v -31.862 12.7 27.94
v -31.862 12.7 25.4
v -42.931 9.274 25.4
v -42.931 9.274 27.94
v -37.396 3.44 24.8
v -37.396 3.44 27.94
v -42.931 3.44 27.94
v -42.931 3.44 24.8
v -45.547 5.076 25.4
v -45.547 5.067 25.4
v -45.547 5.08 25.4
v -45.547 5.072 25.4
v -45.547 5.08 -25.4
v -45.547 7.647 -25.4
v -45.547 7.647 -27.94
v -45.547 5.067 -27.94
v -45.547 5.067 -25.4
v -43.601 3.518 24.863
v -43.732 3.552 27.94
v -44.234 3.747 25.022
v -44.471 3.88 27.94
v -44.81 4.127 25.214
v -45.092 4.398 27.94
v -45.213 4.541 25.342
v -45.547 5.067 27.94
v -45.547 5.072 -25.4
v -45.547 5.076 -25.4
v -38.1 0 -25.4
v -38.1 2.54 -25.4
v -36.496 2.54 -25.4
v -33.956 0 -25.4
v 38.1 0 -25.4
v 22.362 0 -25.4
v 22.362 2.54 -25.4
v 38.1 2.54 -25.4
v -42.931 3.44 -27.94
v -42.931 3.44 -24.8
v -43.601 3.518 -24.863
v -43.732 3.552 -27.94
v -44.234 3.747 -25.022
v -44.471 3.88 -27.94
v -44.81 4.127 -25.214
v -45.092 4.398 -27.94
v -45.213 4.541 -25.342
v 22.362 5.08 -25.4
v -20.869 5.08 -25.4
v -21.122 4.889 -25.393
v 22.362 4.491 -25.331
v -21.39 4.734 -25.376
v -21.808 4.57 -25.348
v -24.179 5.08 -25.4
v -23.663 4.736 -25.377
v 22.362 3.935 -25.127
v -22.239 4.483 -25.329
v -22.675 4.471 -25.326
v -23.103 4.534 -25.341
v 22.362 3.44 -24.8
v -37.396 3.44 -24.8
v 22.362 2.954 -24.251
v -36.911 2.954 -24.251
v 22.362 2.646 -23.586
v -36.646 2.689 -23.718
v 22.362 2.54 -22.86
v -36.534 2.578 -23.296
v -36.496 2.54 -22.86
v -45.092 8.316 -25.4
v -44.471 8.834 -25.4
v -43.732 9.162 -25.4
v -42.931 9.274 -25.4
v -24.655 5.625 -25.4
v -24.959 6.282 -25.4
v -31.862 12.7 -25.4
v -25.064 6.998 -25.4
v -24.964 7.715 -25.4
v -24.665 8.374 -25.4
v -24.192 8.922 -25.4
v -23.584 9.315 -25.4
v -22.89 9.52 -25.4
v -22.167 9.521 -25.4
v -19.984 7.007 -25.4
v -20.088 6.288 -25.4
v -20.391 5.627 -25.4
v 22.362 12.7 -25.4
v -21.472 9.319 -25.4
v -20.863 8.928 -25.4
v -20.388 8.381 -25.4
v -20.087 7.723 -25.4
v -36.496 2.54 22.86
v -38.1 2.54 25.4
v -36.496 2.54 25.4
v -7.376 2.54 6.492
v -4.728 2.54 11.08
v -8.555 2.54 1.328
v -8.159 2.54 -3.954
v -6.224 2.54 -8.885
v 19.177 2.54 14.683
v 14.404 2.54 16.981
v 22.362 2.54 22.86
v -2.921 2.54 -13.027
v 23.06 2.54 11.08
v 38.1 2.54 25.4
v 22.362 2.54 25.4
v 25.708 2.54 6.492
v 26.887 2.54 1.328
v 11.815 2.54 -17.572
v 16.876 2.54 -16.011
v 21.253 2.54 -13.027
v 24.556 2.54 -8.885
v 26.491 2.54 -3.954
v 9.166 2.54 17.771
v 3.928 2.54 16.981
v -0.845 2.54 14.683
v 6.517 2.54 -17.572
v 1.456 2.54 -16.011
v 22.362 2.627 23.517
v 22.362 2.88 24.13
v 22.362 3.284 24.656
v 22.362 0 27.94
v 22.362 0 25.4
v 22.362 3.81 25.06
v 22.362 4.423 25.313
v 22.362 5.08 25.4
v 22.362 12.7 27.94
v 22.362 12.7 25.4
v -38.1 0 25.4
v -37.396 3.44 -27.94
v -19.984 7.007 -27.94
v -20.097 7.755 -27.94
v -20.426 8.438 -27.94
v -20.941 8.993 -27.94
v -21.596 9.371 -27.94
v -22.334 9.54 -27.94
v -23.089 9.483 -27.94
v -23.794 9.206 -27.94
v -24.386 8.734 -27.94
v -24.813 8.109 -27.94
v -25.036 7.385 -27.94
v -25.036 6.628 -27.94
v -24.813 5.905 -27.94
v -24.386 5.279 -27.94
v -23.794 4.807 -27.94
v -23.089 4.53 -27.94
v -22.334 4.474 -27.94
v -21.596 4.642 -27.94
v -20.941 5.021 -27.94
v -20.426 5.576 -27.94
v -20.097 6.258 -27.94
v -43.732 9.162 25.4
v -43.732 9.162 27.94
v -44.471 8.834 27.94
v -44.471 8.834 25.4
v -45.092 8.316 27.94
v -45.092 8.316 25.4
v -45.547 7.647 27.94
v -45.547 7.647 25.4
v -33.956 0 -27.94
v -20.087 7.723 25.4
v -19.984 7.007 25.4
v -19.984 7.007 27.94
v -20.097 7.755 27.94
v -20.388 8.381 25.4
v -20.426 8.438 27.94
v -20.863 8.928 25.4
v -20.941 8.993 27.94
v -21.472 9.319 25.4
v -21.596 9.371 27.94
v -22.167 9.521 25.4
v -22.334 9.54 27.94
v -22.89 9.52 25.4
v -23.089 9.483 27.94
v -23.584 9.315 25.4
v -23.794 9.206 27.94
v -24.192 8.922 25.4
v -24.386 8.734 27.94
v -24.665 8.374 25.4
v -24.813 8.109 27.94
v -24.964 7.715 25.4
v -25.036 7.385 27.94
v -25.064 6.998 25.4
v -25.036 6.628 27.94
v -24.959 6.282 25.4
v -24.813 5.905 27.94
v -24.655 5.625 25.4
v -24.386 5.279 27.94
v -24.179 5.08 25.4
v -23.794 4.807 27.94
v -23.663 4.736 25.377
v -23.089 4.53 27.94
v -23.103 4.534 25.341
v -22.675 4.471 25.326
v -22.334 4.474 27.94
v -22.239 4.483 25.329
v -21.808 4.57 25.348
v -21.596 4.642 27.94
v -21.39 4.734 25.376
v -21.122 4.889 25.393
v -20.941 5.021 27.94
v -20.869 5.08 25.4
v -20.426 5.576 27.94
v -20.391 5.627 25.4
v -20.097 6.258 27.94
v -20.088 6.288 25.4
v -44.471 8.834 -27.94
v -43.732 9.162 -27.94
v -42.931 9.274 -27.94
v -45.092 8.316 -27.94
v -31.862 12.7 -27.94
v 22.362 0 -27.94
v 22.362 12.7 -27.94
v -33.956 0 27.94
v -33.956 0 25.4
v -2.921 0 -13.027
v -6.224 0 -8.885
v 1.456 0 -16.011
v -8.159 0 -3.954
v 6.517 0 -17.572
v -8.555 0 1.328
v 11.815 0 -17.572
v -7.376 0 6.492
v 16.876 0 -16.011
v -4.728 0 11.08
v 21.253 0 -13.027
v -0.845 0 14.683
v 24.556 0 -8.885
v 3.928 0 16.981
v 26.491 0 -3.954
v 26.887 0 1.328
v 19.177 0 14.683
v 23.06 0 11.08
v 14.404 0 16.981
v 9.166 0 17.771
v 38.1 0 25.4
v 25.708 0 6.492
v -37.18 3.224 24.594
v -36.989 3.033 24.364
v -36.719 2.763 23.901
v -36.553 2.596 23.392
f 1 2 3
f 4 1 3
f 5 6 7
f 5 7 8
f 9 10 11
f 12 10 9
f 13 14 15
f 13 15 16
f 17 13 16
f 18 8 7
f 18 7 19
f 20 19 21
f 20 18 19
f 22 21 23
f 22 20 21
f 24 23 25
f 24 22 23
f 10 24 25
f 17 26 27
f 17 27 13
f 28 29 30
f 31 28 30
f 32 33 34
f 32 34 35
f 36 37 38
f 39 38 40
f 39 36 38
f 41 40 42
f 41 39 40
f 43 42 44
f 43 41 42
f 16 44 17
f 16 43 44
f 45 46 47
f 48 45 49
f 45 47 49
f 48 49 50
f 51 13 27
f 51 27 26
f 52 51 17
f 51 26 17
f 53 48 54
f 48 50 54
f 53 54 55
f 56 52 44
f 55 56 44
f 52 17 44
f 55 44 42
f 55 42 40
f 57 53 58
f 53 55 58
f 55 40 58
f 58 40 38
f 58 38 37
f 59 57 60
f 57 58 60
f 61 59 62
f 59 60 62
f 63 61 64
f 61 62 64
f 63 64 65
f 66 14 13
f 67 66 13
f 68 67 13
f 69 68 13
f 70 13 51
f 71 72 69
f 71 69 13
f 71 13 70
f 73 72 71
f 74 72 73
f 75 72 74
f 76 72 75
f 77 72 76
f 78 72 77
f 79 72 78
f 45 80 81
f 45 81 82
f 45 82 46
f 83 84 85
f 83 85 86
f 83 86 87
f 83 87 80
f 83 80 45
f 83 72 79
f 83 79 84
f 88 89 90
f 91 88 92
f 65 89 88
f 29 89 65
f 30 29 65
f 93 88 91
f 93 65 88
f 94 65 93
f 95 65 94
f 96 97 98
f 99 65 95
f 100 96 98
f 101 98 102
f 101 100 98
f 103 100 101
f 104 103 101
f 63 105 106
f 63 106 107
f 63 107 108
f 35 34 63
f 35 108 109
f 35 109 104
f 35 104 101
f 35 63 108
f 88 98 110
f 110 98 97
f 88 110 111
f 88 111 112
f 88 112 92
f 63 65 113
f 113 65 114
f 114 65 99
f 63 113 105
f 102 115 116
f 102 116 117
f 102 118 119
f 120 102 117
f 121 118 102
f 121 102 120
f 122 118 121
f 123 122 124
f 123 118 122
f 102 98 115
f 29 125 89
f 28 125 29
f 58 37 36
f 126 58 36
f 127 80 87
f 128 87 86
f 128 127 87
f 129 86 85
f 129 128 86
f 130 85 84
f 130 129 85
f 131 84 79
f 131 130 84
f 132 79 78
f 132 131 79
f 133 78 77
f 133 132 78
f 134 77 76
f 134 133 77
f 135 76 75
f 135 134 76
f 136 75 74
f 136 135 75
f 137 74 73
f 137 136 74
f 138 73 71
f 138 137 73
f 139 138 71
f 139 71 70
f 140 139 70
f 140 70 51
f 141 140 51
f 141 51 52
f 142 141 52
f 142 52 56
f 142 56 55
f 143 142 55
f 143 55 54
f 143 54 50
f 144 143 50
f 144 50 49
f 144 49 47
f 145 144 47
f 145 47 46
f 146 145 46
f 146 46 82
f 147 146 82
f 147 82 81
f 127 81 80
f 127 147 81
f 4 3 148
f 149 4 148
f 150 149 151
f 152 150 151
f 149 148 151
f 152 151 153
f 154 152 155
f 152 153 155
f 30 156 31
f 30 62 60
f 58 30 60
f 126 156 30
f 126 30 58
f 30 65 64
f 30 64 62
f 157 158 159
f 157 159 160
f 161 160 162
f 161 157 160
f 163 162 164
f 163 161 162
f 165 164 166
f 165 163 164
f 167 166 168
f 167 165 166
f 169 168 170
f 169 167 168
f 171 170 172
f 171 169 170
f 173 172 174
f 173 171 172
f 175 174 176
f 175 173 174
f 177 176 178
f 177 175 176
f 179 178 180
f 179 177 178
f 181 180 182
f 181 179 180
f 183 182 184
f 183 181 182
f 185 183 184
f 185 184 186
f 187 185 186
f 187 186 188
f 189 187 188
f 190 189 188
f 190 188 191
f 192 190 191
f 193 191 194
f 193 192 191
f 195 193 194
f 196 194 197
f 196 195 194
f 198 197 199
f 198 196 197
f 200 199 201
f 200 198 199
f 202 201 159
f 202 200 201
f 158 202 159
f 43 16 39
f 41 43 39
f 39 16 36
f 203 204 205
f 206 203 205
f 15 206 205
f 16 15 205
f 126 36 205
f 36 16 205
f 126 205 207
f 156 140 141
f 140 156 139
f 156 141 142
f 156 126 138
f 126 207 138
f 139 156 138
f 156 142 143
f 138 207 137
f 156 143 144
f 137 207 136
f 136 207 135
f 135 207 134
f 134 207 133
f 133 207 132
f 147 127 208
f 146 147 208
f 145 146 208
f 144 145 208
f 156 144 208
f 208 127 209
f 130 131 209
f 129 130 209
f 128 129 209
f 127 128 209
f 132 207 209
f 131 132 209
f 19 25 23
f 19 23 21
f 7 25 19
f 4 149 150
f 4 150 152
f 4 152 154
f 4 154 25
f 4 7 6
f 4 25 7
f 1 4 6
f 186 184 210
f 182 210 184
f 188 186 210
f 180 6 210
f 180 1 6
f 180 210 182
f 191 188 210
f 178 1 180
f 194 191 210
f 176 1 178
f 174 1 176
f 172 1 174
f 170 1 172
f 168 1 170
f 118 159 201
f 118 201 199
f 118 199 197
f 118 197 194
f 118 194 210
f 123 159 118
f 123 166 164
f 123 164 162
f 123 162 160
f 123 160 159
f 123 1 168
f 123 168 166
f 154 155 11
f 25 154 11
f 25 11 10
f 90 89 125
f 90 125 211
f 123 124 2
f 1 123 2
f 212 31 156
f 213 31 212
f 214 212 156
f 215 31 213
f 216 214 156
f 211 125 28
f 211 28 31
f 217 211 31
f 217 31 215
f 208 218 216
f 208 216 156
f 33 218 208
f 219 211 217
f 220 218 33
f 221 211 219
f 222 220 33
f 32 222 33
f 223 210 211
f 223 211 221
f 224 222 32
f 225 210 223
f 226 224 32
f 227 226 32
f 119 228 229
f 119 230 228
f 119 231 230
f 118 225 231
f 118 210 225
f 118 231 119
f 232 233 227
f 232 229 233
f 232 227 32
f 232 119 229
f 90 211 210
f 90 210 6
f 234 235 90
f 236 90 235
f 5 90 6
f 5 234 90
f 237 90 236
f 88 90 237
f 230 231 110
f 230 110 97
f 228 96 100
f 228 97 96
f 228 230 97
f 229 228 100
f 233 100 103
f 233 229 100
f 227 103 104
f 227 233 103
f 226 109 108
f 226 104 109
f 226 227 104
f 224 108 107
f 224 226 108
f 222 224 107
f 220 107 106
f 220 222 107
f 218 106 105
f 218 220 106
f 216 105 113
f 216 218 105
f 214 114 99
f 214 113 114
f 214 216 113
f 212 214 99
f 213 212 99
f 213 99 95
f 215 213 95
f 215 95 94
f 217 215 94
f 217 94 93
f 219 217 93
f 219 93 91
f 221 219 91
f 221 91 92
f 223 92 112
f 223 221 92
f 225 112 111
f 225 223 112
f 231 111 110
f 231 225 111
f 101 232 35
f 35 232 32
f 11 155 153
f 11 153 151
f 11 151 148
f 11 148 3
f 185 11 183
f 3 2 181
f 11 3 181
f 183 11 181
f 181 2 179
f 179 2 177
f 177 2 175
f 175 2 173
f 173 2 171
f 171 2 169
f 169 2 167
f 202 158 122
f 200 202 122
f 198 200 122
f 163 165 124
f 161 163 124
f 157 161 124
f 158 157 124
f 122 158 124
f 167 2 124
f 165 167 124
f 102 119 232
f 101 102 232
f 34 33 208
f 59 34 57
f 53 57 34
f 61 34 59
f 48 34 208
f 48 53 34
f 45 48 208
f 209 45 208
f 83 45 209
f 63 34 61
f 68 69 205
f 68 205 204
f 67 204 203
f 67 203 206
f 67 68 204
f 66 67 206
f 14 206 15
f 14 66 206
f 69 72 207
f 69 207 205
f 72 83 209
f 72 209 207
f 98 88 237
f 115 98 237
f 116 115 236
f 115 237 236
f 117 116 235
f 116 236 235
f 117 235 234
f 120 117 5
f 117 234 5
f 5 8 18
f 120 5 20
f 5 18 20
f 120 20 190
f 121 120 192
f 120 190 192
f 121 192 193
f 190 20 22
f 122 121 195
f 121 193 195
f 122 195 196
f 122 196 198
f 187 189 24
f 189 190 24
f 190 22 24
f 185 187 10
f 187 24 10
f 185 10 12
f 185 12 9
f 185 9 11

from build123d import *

# Parameters (mm, degrees)
SKETCH1_W               = 76.2
SKETCH1_H               = 50.8
BOSS_EXTRUDE1_DEPTH     = 2.54
BOSS_EXTRUDE3_DEPTH     = 2.54
FILLET1_START           = -37.396373698
FILLET1_DEPTH           = 59.758551136
FILLET1_START_2         = -45.547043779
FILLET1_2_DEPTH         = 8.279361144
FILLET1_START_3         = 22
FILLET1_3_DEPTH         = 3.4
FILLET2_START           = -42.930825639
FILLET2_DEPTH           = 65.293003077
FILLET2_START_2         = -37.396373698
FILLET2_2_DEPTH         = 59.758551136
FILLET2_START_3         = -45.547043779
FILLET2_3_DEPTH         = 2.61621814
FILLET2_START_4         = -25.4
FILLET2_4_DEPTH         = 3.4
CUT_EXTRUDE1_DEPTH      = 74.201076537
CUT_EXTRUDE1_DEPTH_BACK = 74.201076537
SKETCH3_R               = 2.54
CUT_EXTRUDE2_DEPTH      = 55.391197925
CUT_EXTRUDE2_DEPTH_BACK = 55.391197925
SKETCH4_R               = 17.770620532


with BuildPart() as part:
    # Sketch1 → Boss-Extrude1 (new body)
    with BuildSketch(Plane(origin=(0, 0, 0), x_dir=(1, 0, 0), z_dir=(0, 1, 0))):
        Rectangle(SKETCH1_W, SKETCH1_H)
    extrude(amount=BOSS_EXTRUDE1_DEPTH)

    # Sketch2 → Boss-Extrude3 (add)
    with BuildSketch(Plane.XY.offset(25.4)):
        Polygon((22.362177438, 0), (22.362177438, 2.54), (-36.496143753, 2.54), (-33.956143753, 0), align=None)
        with BuildLine():
            Line((22.362177438, 12.7), (-31.861921757, 12.7))
            Line((-31.861921757, 12.7), (-42.930825639, 9.27384145))
            ThreePointArc((-42.930825639, 9.27384145), (-44.471302904, 8.833865445), (-45.547043679, 7.646670905))
            Line((-45.547043679, 7.646670905), (-45.547043679, 5.06740049))
            ThreePointArc((-45.547043679, 5.06740049), (-44.471302904, 3.88020595), (-42.930825639, 3.440229945))
            Line((-42.930825639, 3.440229945), (-37.396373698, 3.440229945))
            Line((-37.396373698, 3.440229945), (-36.496143753, 2.54))
            Line((-36.496143753, 2.54), (22.362177438, 2.54))
            Line((22.362177438, 2.54), (22.362177438, 12.7))
        make_face()
    boss_extrude3 = extrude(amount=BOSS_EXTRUDE3_DEPTH)

    # Fillet1: read off the stored shape, not the designer's step
    # Fillet1 outline → Fillet1 (add)
    with BuildSketch(Plane.YZ.offset(FILLET1_START)):
        with BuildLine():
            ThreePointArc((2.54, 22.86), (3.283948776, 24.656051224), (5.08, 25.4))
            Line((5.08, 25.4), (2.54, 25.4))
            Line((2.54, 25.4), (2.54, 22.86))
        make_face()
    extrude(amount=FILLET1_DEPTH)

    # Fillet1 2 outline → Fillet1 2 (add)
    with BuildSketch(Plane.YZ.offset(FILLET1_START_2)):
        with BuildLine():
            Line((3.440229945, 25.4), (3.440229945, 24.799781989))
            ThreePointArc((3.440229945, 24.799781989), (4.206915311, 25.245230204), (5.08, 25.4))
            Line((5.08, 25.4), (3.440229945, 25.4))
        make_face()
    extrude(amount=FILLET1_2_DEPTH)

    # Fillet1 3 outline → Fillet1 3 (cut)
    with BuildSketch(Plane.XY.offset(FILLET1_START_3)):
        with BuildLine():
            Line((-45.547043779, 3.440229945), (-42.930825639, 3.440229945))
            ThreePointArc((-42.930825639, 3.440229945), (-44.471302904, 3.88020595), (-45.547043679, 5.06740049))
            Line((-45.547043679, 5.06740049), (-45.547043779, 3.440229945))
        make_face()
        Polygon((-36.496143753, 2.54), (-37.396373698, 3.440229945), (-37.396373698, 2.54), align=None)
    extrude(amount=FILLET1_3_DEPTH, mode=Mode.SUBTRACT)

    # Mirror1: Boss-Extrude3 across plane
    add(boss_extrude3.mirror(Plane.XY))

    # Fillet2: read off the stored shape, not the designer's step
    # Fillet2 outline → Fillet2 (add)
    with BuildSketch(Plane.YZ.offset(FILLET2_START)):
        with BuildLine():
            ThreePointArc((5.08, -25.4), (4.206915311, -25.245230204), (3.440229945, -24.799781989))
            Line((3.440229945, -24.799781989), (3.440229945, -25.4))
            Line((3.440229945, -25.4), (5.08, -25.4))
        make_face()
    extrude(amount=FILLET2_DEPTH)

    # Fillet2 2 outline → Fillet2 2 (add)
    with BuildSketch(Plane.YZ.offset(FILLET2_START_2)):
        with BuildLine():
            ThreePointArc((3.440229945, -24.799781989), (2.776023444, -23.929248348), (2.54, -22.86))
            Line((2.54, -22.86), (2.54, -25.4))
            Line((2.54, -25.4), (3.440229945, -25.4))
            Line((3.440229945, -25.4), (3.440229945, -24.799781989))
        make_face()
    extrude(amount=FILLET2_2_DEPTH)

    # Fillet2 3 outline → Fillet2 3 (add)
    with BuildSketch(Plane.YZ.offset(FILLET2_START_3)):
        with BuildLine():
            ThreePointArc((5.08, -25.4), (4.206915311, -25.245230204), (3.440229945, -24.799781989))
            Line((3.440229945, -24.799781989), (3.440229945, -25.4))
            Line((3.440229945, -25.4), (5.08, -25.4))
        make_face()
    extrude(amount=FILLET2_3_DEPTH)

    # Fillet2 4 outline → Fillet2 4 (cut)
    with BuildSketch(Plane.XY.offset(FILLET2_START_4)):
        Polygon((-36.496143753, 2.54), (-37.396373698, 3.440229945), (-37.396373698, 2.54), align=None)
        with BuildLine():
            ThreePointArc((-42.930825639, 3.440229945), (-44.471302904, 3.88020595), (-45.547043679, 5.06740049))
            Line((-45.547043679, 5.06740049), (-45.547043779, 3.440229945))
            Line((-45.547043779, 3.440229945), (-42.930825639, 3.440229945))
        make_face()
    extrude(amount=FILLET2_4_DEPTH, mode=Mode.SUBTRACT)

    # Sketch3 → Cut-Extrude1 (cut, two sides: drawn at the far end of the back side and taken through both)
    with BuildSketch(Plane.XY.offset(27.94).offset(-CUT_EXTRUDE1_DEPTH_BACK)):
        with Locations((-22.524221352, 7.006792996)):
            Circle(SKETCH3_R)
    extrude(amount=CUT_EXTRUDE1_DEPTH + CUT_EXTRUDE1_DEPTH_BACK, mode=Mode.SUBTRACT)

    # Sketch4 → Cut-Extrude2 (cut, two sides: drawn at the far end of the back side and taken through both)
    with BuildSketch(Plane(origin=(0, 2.54, 0), x_dir=(1, 0, 0), z_dir=(0, 1, 0)).offset(-CUT_EXTRUDE2_DEPTH_BACK)):
        with Locations(Location((9.166040708, 0, 0), (0, 0, 270))):
            Circle(SKETCH4_R)
    extrude(amount=CUT_EXTRUDE2_DEPTH + CUT_EXTRUDE2_DEPTH_BACK, mode=Mode.SUBTRACT)


solid = part.part
